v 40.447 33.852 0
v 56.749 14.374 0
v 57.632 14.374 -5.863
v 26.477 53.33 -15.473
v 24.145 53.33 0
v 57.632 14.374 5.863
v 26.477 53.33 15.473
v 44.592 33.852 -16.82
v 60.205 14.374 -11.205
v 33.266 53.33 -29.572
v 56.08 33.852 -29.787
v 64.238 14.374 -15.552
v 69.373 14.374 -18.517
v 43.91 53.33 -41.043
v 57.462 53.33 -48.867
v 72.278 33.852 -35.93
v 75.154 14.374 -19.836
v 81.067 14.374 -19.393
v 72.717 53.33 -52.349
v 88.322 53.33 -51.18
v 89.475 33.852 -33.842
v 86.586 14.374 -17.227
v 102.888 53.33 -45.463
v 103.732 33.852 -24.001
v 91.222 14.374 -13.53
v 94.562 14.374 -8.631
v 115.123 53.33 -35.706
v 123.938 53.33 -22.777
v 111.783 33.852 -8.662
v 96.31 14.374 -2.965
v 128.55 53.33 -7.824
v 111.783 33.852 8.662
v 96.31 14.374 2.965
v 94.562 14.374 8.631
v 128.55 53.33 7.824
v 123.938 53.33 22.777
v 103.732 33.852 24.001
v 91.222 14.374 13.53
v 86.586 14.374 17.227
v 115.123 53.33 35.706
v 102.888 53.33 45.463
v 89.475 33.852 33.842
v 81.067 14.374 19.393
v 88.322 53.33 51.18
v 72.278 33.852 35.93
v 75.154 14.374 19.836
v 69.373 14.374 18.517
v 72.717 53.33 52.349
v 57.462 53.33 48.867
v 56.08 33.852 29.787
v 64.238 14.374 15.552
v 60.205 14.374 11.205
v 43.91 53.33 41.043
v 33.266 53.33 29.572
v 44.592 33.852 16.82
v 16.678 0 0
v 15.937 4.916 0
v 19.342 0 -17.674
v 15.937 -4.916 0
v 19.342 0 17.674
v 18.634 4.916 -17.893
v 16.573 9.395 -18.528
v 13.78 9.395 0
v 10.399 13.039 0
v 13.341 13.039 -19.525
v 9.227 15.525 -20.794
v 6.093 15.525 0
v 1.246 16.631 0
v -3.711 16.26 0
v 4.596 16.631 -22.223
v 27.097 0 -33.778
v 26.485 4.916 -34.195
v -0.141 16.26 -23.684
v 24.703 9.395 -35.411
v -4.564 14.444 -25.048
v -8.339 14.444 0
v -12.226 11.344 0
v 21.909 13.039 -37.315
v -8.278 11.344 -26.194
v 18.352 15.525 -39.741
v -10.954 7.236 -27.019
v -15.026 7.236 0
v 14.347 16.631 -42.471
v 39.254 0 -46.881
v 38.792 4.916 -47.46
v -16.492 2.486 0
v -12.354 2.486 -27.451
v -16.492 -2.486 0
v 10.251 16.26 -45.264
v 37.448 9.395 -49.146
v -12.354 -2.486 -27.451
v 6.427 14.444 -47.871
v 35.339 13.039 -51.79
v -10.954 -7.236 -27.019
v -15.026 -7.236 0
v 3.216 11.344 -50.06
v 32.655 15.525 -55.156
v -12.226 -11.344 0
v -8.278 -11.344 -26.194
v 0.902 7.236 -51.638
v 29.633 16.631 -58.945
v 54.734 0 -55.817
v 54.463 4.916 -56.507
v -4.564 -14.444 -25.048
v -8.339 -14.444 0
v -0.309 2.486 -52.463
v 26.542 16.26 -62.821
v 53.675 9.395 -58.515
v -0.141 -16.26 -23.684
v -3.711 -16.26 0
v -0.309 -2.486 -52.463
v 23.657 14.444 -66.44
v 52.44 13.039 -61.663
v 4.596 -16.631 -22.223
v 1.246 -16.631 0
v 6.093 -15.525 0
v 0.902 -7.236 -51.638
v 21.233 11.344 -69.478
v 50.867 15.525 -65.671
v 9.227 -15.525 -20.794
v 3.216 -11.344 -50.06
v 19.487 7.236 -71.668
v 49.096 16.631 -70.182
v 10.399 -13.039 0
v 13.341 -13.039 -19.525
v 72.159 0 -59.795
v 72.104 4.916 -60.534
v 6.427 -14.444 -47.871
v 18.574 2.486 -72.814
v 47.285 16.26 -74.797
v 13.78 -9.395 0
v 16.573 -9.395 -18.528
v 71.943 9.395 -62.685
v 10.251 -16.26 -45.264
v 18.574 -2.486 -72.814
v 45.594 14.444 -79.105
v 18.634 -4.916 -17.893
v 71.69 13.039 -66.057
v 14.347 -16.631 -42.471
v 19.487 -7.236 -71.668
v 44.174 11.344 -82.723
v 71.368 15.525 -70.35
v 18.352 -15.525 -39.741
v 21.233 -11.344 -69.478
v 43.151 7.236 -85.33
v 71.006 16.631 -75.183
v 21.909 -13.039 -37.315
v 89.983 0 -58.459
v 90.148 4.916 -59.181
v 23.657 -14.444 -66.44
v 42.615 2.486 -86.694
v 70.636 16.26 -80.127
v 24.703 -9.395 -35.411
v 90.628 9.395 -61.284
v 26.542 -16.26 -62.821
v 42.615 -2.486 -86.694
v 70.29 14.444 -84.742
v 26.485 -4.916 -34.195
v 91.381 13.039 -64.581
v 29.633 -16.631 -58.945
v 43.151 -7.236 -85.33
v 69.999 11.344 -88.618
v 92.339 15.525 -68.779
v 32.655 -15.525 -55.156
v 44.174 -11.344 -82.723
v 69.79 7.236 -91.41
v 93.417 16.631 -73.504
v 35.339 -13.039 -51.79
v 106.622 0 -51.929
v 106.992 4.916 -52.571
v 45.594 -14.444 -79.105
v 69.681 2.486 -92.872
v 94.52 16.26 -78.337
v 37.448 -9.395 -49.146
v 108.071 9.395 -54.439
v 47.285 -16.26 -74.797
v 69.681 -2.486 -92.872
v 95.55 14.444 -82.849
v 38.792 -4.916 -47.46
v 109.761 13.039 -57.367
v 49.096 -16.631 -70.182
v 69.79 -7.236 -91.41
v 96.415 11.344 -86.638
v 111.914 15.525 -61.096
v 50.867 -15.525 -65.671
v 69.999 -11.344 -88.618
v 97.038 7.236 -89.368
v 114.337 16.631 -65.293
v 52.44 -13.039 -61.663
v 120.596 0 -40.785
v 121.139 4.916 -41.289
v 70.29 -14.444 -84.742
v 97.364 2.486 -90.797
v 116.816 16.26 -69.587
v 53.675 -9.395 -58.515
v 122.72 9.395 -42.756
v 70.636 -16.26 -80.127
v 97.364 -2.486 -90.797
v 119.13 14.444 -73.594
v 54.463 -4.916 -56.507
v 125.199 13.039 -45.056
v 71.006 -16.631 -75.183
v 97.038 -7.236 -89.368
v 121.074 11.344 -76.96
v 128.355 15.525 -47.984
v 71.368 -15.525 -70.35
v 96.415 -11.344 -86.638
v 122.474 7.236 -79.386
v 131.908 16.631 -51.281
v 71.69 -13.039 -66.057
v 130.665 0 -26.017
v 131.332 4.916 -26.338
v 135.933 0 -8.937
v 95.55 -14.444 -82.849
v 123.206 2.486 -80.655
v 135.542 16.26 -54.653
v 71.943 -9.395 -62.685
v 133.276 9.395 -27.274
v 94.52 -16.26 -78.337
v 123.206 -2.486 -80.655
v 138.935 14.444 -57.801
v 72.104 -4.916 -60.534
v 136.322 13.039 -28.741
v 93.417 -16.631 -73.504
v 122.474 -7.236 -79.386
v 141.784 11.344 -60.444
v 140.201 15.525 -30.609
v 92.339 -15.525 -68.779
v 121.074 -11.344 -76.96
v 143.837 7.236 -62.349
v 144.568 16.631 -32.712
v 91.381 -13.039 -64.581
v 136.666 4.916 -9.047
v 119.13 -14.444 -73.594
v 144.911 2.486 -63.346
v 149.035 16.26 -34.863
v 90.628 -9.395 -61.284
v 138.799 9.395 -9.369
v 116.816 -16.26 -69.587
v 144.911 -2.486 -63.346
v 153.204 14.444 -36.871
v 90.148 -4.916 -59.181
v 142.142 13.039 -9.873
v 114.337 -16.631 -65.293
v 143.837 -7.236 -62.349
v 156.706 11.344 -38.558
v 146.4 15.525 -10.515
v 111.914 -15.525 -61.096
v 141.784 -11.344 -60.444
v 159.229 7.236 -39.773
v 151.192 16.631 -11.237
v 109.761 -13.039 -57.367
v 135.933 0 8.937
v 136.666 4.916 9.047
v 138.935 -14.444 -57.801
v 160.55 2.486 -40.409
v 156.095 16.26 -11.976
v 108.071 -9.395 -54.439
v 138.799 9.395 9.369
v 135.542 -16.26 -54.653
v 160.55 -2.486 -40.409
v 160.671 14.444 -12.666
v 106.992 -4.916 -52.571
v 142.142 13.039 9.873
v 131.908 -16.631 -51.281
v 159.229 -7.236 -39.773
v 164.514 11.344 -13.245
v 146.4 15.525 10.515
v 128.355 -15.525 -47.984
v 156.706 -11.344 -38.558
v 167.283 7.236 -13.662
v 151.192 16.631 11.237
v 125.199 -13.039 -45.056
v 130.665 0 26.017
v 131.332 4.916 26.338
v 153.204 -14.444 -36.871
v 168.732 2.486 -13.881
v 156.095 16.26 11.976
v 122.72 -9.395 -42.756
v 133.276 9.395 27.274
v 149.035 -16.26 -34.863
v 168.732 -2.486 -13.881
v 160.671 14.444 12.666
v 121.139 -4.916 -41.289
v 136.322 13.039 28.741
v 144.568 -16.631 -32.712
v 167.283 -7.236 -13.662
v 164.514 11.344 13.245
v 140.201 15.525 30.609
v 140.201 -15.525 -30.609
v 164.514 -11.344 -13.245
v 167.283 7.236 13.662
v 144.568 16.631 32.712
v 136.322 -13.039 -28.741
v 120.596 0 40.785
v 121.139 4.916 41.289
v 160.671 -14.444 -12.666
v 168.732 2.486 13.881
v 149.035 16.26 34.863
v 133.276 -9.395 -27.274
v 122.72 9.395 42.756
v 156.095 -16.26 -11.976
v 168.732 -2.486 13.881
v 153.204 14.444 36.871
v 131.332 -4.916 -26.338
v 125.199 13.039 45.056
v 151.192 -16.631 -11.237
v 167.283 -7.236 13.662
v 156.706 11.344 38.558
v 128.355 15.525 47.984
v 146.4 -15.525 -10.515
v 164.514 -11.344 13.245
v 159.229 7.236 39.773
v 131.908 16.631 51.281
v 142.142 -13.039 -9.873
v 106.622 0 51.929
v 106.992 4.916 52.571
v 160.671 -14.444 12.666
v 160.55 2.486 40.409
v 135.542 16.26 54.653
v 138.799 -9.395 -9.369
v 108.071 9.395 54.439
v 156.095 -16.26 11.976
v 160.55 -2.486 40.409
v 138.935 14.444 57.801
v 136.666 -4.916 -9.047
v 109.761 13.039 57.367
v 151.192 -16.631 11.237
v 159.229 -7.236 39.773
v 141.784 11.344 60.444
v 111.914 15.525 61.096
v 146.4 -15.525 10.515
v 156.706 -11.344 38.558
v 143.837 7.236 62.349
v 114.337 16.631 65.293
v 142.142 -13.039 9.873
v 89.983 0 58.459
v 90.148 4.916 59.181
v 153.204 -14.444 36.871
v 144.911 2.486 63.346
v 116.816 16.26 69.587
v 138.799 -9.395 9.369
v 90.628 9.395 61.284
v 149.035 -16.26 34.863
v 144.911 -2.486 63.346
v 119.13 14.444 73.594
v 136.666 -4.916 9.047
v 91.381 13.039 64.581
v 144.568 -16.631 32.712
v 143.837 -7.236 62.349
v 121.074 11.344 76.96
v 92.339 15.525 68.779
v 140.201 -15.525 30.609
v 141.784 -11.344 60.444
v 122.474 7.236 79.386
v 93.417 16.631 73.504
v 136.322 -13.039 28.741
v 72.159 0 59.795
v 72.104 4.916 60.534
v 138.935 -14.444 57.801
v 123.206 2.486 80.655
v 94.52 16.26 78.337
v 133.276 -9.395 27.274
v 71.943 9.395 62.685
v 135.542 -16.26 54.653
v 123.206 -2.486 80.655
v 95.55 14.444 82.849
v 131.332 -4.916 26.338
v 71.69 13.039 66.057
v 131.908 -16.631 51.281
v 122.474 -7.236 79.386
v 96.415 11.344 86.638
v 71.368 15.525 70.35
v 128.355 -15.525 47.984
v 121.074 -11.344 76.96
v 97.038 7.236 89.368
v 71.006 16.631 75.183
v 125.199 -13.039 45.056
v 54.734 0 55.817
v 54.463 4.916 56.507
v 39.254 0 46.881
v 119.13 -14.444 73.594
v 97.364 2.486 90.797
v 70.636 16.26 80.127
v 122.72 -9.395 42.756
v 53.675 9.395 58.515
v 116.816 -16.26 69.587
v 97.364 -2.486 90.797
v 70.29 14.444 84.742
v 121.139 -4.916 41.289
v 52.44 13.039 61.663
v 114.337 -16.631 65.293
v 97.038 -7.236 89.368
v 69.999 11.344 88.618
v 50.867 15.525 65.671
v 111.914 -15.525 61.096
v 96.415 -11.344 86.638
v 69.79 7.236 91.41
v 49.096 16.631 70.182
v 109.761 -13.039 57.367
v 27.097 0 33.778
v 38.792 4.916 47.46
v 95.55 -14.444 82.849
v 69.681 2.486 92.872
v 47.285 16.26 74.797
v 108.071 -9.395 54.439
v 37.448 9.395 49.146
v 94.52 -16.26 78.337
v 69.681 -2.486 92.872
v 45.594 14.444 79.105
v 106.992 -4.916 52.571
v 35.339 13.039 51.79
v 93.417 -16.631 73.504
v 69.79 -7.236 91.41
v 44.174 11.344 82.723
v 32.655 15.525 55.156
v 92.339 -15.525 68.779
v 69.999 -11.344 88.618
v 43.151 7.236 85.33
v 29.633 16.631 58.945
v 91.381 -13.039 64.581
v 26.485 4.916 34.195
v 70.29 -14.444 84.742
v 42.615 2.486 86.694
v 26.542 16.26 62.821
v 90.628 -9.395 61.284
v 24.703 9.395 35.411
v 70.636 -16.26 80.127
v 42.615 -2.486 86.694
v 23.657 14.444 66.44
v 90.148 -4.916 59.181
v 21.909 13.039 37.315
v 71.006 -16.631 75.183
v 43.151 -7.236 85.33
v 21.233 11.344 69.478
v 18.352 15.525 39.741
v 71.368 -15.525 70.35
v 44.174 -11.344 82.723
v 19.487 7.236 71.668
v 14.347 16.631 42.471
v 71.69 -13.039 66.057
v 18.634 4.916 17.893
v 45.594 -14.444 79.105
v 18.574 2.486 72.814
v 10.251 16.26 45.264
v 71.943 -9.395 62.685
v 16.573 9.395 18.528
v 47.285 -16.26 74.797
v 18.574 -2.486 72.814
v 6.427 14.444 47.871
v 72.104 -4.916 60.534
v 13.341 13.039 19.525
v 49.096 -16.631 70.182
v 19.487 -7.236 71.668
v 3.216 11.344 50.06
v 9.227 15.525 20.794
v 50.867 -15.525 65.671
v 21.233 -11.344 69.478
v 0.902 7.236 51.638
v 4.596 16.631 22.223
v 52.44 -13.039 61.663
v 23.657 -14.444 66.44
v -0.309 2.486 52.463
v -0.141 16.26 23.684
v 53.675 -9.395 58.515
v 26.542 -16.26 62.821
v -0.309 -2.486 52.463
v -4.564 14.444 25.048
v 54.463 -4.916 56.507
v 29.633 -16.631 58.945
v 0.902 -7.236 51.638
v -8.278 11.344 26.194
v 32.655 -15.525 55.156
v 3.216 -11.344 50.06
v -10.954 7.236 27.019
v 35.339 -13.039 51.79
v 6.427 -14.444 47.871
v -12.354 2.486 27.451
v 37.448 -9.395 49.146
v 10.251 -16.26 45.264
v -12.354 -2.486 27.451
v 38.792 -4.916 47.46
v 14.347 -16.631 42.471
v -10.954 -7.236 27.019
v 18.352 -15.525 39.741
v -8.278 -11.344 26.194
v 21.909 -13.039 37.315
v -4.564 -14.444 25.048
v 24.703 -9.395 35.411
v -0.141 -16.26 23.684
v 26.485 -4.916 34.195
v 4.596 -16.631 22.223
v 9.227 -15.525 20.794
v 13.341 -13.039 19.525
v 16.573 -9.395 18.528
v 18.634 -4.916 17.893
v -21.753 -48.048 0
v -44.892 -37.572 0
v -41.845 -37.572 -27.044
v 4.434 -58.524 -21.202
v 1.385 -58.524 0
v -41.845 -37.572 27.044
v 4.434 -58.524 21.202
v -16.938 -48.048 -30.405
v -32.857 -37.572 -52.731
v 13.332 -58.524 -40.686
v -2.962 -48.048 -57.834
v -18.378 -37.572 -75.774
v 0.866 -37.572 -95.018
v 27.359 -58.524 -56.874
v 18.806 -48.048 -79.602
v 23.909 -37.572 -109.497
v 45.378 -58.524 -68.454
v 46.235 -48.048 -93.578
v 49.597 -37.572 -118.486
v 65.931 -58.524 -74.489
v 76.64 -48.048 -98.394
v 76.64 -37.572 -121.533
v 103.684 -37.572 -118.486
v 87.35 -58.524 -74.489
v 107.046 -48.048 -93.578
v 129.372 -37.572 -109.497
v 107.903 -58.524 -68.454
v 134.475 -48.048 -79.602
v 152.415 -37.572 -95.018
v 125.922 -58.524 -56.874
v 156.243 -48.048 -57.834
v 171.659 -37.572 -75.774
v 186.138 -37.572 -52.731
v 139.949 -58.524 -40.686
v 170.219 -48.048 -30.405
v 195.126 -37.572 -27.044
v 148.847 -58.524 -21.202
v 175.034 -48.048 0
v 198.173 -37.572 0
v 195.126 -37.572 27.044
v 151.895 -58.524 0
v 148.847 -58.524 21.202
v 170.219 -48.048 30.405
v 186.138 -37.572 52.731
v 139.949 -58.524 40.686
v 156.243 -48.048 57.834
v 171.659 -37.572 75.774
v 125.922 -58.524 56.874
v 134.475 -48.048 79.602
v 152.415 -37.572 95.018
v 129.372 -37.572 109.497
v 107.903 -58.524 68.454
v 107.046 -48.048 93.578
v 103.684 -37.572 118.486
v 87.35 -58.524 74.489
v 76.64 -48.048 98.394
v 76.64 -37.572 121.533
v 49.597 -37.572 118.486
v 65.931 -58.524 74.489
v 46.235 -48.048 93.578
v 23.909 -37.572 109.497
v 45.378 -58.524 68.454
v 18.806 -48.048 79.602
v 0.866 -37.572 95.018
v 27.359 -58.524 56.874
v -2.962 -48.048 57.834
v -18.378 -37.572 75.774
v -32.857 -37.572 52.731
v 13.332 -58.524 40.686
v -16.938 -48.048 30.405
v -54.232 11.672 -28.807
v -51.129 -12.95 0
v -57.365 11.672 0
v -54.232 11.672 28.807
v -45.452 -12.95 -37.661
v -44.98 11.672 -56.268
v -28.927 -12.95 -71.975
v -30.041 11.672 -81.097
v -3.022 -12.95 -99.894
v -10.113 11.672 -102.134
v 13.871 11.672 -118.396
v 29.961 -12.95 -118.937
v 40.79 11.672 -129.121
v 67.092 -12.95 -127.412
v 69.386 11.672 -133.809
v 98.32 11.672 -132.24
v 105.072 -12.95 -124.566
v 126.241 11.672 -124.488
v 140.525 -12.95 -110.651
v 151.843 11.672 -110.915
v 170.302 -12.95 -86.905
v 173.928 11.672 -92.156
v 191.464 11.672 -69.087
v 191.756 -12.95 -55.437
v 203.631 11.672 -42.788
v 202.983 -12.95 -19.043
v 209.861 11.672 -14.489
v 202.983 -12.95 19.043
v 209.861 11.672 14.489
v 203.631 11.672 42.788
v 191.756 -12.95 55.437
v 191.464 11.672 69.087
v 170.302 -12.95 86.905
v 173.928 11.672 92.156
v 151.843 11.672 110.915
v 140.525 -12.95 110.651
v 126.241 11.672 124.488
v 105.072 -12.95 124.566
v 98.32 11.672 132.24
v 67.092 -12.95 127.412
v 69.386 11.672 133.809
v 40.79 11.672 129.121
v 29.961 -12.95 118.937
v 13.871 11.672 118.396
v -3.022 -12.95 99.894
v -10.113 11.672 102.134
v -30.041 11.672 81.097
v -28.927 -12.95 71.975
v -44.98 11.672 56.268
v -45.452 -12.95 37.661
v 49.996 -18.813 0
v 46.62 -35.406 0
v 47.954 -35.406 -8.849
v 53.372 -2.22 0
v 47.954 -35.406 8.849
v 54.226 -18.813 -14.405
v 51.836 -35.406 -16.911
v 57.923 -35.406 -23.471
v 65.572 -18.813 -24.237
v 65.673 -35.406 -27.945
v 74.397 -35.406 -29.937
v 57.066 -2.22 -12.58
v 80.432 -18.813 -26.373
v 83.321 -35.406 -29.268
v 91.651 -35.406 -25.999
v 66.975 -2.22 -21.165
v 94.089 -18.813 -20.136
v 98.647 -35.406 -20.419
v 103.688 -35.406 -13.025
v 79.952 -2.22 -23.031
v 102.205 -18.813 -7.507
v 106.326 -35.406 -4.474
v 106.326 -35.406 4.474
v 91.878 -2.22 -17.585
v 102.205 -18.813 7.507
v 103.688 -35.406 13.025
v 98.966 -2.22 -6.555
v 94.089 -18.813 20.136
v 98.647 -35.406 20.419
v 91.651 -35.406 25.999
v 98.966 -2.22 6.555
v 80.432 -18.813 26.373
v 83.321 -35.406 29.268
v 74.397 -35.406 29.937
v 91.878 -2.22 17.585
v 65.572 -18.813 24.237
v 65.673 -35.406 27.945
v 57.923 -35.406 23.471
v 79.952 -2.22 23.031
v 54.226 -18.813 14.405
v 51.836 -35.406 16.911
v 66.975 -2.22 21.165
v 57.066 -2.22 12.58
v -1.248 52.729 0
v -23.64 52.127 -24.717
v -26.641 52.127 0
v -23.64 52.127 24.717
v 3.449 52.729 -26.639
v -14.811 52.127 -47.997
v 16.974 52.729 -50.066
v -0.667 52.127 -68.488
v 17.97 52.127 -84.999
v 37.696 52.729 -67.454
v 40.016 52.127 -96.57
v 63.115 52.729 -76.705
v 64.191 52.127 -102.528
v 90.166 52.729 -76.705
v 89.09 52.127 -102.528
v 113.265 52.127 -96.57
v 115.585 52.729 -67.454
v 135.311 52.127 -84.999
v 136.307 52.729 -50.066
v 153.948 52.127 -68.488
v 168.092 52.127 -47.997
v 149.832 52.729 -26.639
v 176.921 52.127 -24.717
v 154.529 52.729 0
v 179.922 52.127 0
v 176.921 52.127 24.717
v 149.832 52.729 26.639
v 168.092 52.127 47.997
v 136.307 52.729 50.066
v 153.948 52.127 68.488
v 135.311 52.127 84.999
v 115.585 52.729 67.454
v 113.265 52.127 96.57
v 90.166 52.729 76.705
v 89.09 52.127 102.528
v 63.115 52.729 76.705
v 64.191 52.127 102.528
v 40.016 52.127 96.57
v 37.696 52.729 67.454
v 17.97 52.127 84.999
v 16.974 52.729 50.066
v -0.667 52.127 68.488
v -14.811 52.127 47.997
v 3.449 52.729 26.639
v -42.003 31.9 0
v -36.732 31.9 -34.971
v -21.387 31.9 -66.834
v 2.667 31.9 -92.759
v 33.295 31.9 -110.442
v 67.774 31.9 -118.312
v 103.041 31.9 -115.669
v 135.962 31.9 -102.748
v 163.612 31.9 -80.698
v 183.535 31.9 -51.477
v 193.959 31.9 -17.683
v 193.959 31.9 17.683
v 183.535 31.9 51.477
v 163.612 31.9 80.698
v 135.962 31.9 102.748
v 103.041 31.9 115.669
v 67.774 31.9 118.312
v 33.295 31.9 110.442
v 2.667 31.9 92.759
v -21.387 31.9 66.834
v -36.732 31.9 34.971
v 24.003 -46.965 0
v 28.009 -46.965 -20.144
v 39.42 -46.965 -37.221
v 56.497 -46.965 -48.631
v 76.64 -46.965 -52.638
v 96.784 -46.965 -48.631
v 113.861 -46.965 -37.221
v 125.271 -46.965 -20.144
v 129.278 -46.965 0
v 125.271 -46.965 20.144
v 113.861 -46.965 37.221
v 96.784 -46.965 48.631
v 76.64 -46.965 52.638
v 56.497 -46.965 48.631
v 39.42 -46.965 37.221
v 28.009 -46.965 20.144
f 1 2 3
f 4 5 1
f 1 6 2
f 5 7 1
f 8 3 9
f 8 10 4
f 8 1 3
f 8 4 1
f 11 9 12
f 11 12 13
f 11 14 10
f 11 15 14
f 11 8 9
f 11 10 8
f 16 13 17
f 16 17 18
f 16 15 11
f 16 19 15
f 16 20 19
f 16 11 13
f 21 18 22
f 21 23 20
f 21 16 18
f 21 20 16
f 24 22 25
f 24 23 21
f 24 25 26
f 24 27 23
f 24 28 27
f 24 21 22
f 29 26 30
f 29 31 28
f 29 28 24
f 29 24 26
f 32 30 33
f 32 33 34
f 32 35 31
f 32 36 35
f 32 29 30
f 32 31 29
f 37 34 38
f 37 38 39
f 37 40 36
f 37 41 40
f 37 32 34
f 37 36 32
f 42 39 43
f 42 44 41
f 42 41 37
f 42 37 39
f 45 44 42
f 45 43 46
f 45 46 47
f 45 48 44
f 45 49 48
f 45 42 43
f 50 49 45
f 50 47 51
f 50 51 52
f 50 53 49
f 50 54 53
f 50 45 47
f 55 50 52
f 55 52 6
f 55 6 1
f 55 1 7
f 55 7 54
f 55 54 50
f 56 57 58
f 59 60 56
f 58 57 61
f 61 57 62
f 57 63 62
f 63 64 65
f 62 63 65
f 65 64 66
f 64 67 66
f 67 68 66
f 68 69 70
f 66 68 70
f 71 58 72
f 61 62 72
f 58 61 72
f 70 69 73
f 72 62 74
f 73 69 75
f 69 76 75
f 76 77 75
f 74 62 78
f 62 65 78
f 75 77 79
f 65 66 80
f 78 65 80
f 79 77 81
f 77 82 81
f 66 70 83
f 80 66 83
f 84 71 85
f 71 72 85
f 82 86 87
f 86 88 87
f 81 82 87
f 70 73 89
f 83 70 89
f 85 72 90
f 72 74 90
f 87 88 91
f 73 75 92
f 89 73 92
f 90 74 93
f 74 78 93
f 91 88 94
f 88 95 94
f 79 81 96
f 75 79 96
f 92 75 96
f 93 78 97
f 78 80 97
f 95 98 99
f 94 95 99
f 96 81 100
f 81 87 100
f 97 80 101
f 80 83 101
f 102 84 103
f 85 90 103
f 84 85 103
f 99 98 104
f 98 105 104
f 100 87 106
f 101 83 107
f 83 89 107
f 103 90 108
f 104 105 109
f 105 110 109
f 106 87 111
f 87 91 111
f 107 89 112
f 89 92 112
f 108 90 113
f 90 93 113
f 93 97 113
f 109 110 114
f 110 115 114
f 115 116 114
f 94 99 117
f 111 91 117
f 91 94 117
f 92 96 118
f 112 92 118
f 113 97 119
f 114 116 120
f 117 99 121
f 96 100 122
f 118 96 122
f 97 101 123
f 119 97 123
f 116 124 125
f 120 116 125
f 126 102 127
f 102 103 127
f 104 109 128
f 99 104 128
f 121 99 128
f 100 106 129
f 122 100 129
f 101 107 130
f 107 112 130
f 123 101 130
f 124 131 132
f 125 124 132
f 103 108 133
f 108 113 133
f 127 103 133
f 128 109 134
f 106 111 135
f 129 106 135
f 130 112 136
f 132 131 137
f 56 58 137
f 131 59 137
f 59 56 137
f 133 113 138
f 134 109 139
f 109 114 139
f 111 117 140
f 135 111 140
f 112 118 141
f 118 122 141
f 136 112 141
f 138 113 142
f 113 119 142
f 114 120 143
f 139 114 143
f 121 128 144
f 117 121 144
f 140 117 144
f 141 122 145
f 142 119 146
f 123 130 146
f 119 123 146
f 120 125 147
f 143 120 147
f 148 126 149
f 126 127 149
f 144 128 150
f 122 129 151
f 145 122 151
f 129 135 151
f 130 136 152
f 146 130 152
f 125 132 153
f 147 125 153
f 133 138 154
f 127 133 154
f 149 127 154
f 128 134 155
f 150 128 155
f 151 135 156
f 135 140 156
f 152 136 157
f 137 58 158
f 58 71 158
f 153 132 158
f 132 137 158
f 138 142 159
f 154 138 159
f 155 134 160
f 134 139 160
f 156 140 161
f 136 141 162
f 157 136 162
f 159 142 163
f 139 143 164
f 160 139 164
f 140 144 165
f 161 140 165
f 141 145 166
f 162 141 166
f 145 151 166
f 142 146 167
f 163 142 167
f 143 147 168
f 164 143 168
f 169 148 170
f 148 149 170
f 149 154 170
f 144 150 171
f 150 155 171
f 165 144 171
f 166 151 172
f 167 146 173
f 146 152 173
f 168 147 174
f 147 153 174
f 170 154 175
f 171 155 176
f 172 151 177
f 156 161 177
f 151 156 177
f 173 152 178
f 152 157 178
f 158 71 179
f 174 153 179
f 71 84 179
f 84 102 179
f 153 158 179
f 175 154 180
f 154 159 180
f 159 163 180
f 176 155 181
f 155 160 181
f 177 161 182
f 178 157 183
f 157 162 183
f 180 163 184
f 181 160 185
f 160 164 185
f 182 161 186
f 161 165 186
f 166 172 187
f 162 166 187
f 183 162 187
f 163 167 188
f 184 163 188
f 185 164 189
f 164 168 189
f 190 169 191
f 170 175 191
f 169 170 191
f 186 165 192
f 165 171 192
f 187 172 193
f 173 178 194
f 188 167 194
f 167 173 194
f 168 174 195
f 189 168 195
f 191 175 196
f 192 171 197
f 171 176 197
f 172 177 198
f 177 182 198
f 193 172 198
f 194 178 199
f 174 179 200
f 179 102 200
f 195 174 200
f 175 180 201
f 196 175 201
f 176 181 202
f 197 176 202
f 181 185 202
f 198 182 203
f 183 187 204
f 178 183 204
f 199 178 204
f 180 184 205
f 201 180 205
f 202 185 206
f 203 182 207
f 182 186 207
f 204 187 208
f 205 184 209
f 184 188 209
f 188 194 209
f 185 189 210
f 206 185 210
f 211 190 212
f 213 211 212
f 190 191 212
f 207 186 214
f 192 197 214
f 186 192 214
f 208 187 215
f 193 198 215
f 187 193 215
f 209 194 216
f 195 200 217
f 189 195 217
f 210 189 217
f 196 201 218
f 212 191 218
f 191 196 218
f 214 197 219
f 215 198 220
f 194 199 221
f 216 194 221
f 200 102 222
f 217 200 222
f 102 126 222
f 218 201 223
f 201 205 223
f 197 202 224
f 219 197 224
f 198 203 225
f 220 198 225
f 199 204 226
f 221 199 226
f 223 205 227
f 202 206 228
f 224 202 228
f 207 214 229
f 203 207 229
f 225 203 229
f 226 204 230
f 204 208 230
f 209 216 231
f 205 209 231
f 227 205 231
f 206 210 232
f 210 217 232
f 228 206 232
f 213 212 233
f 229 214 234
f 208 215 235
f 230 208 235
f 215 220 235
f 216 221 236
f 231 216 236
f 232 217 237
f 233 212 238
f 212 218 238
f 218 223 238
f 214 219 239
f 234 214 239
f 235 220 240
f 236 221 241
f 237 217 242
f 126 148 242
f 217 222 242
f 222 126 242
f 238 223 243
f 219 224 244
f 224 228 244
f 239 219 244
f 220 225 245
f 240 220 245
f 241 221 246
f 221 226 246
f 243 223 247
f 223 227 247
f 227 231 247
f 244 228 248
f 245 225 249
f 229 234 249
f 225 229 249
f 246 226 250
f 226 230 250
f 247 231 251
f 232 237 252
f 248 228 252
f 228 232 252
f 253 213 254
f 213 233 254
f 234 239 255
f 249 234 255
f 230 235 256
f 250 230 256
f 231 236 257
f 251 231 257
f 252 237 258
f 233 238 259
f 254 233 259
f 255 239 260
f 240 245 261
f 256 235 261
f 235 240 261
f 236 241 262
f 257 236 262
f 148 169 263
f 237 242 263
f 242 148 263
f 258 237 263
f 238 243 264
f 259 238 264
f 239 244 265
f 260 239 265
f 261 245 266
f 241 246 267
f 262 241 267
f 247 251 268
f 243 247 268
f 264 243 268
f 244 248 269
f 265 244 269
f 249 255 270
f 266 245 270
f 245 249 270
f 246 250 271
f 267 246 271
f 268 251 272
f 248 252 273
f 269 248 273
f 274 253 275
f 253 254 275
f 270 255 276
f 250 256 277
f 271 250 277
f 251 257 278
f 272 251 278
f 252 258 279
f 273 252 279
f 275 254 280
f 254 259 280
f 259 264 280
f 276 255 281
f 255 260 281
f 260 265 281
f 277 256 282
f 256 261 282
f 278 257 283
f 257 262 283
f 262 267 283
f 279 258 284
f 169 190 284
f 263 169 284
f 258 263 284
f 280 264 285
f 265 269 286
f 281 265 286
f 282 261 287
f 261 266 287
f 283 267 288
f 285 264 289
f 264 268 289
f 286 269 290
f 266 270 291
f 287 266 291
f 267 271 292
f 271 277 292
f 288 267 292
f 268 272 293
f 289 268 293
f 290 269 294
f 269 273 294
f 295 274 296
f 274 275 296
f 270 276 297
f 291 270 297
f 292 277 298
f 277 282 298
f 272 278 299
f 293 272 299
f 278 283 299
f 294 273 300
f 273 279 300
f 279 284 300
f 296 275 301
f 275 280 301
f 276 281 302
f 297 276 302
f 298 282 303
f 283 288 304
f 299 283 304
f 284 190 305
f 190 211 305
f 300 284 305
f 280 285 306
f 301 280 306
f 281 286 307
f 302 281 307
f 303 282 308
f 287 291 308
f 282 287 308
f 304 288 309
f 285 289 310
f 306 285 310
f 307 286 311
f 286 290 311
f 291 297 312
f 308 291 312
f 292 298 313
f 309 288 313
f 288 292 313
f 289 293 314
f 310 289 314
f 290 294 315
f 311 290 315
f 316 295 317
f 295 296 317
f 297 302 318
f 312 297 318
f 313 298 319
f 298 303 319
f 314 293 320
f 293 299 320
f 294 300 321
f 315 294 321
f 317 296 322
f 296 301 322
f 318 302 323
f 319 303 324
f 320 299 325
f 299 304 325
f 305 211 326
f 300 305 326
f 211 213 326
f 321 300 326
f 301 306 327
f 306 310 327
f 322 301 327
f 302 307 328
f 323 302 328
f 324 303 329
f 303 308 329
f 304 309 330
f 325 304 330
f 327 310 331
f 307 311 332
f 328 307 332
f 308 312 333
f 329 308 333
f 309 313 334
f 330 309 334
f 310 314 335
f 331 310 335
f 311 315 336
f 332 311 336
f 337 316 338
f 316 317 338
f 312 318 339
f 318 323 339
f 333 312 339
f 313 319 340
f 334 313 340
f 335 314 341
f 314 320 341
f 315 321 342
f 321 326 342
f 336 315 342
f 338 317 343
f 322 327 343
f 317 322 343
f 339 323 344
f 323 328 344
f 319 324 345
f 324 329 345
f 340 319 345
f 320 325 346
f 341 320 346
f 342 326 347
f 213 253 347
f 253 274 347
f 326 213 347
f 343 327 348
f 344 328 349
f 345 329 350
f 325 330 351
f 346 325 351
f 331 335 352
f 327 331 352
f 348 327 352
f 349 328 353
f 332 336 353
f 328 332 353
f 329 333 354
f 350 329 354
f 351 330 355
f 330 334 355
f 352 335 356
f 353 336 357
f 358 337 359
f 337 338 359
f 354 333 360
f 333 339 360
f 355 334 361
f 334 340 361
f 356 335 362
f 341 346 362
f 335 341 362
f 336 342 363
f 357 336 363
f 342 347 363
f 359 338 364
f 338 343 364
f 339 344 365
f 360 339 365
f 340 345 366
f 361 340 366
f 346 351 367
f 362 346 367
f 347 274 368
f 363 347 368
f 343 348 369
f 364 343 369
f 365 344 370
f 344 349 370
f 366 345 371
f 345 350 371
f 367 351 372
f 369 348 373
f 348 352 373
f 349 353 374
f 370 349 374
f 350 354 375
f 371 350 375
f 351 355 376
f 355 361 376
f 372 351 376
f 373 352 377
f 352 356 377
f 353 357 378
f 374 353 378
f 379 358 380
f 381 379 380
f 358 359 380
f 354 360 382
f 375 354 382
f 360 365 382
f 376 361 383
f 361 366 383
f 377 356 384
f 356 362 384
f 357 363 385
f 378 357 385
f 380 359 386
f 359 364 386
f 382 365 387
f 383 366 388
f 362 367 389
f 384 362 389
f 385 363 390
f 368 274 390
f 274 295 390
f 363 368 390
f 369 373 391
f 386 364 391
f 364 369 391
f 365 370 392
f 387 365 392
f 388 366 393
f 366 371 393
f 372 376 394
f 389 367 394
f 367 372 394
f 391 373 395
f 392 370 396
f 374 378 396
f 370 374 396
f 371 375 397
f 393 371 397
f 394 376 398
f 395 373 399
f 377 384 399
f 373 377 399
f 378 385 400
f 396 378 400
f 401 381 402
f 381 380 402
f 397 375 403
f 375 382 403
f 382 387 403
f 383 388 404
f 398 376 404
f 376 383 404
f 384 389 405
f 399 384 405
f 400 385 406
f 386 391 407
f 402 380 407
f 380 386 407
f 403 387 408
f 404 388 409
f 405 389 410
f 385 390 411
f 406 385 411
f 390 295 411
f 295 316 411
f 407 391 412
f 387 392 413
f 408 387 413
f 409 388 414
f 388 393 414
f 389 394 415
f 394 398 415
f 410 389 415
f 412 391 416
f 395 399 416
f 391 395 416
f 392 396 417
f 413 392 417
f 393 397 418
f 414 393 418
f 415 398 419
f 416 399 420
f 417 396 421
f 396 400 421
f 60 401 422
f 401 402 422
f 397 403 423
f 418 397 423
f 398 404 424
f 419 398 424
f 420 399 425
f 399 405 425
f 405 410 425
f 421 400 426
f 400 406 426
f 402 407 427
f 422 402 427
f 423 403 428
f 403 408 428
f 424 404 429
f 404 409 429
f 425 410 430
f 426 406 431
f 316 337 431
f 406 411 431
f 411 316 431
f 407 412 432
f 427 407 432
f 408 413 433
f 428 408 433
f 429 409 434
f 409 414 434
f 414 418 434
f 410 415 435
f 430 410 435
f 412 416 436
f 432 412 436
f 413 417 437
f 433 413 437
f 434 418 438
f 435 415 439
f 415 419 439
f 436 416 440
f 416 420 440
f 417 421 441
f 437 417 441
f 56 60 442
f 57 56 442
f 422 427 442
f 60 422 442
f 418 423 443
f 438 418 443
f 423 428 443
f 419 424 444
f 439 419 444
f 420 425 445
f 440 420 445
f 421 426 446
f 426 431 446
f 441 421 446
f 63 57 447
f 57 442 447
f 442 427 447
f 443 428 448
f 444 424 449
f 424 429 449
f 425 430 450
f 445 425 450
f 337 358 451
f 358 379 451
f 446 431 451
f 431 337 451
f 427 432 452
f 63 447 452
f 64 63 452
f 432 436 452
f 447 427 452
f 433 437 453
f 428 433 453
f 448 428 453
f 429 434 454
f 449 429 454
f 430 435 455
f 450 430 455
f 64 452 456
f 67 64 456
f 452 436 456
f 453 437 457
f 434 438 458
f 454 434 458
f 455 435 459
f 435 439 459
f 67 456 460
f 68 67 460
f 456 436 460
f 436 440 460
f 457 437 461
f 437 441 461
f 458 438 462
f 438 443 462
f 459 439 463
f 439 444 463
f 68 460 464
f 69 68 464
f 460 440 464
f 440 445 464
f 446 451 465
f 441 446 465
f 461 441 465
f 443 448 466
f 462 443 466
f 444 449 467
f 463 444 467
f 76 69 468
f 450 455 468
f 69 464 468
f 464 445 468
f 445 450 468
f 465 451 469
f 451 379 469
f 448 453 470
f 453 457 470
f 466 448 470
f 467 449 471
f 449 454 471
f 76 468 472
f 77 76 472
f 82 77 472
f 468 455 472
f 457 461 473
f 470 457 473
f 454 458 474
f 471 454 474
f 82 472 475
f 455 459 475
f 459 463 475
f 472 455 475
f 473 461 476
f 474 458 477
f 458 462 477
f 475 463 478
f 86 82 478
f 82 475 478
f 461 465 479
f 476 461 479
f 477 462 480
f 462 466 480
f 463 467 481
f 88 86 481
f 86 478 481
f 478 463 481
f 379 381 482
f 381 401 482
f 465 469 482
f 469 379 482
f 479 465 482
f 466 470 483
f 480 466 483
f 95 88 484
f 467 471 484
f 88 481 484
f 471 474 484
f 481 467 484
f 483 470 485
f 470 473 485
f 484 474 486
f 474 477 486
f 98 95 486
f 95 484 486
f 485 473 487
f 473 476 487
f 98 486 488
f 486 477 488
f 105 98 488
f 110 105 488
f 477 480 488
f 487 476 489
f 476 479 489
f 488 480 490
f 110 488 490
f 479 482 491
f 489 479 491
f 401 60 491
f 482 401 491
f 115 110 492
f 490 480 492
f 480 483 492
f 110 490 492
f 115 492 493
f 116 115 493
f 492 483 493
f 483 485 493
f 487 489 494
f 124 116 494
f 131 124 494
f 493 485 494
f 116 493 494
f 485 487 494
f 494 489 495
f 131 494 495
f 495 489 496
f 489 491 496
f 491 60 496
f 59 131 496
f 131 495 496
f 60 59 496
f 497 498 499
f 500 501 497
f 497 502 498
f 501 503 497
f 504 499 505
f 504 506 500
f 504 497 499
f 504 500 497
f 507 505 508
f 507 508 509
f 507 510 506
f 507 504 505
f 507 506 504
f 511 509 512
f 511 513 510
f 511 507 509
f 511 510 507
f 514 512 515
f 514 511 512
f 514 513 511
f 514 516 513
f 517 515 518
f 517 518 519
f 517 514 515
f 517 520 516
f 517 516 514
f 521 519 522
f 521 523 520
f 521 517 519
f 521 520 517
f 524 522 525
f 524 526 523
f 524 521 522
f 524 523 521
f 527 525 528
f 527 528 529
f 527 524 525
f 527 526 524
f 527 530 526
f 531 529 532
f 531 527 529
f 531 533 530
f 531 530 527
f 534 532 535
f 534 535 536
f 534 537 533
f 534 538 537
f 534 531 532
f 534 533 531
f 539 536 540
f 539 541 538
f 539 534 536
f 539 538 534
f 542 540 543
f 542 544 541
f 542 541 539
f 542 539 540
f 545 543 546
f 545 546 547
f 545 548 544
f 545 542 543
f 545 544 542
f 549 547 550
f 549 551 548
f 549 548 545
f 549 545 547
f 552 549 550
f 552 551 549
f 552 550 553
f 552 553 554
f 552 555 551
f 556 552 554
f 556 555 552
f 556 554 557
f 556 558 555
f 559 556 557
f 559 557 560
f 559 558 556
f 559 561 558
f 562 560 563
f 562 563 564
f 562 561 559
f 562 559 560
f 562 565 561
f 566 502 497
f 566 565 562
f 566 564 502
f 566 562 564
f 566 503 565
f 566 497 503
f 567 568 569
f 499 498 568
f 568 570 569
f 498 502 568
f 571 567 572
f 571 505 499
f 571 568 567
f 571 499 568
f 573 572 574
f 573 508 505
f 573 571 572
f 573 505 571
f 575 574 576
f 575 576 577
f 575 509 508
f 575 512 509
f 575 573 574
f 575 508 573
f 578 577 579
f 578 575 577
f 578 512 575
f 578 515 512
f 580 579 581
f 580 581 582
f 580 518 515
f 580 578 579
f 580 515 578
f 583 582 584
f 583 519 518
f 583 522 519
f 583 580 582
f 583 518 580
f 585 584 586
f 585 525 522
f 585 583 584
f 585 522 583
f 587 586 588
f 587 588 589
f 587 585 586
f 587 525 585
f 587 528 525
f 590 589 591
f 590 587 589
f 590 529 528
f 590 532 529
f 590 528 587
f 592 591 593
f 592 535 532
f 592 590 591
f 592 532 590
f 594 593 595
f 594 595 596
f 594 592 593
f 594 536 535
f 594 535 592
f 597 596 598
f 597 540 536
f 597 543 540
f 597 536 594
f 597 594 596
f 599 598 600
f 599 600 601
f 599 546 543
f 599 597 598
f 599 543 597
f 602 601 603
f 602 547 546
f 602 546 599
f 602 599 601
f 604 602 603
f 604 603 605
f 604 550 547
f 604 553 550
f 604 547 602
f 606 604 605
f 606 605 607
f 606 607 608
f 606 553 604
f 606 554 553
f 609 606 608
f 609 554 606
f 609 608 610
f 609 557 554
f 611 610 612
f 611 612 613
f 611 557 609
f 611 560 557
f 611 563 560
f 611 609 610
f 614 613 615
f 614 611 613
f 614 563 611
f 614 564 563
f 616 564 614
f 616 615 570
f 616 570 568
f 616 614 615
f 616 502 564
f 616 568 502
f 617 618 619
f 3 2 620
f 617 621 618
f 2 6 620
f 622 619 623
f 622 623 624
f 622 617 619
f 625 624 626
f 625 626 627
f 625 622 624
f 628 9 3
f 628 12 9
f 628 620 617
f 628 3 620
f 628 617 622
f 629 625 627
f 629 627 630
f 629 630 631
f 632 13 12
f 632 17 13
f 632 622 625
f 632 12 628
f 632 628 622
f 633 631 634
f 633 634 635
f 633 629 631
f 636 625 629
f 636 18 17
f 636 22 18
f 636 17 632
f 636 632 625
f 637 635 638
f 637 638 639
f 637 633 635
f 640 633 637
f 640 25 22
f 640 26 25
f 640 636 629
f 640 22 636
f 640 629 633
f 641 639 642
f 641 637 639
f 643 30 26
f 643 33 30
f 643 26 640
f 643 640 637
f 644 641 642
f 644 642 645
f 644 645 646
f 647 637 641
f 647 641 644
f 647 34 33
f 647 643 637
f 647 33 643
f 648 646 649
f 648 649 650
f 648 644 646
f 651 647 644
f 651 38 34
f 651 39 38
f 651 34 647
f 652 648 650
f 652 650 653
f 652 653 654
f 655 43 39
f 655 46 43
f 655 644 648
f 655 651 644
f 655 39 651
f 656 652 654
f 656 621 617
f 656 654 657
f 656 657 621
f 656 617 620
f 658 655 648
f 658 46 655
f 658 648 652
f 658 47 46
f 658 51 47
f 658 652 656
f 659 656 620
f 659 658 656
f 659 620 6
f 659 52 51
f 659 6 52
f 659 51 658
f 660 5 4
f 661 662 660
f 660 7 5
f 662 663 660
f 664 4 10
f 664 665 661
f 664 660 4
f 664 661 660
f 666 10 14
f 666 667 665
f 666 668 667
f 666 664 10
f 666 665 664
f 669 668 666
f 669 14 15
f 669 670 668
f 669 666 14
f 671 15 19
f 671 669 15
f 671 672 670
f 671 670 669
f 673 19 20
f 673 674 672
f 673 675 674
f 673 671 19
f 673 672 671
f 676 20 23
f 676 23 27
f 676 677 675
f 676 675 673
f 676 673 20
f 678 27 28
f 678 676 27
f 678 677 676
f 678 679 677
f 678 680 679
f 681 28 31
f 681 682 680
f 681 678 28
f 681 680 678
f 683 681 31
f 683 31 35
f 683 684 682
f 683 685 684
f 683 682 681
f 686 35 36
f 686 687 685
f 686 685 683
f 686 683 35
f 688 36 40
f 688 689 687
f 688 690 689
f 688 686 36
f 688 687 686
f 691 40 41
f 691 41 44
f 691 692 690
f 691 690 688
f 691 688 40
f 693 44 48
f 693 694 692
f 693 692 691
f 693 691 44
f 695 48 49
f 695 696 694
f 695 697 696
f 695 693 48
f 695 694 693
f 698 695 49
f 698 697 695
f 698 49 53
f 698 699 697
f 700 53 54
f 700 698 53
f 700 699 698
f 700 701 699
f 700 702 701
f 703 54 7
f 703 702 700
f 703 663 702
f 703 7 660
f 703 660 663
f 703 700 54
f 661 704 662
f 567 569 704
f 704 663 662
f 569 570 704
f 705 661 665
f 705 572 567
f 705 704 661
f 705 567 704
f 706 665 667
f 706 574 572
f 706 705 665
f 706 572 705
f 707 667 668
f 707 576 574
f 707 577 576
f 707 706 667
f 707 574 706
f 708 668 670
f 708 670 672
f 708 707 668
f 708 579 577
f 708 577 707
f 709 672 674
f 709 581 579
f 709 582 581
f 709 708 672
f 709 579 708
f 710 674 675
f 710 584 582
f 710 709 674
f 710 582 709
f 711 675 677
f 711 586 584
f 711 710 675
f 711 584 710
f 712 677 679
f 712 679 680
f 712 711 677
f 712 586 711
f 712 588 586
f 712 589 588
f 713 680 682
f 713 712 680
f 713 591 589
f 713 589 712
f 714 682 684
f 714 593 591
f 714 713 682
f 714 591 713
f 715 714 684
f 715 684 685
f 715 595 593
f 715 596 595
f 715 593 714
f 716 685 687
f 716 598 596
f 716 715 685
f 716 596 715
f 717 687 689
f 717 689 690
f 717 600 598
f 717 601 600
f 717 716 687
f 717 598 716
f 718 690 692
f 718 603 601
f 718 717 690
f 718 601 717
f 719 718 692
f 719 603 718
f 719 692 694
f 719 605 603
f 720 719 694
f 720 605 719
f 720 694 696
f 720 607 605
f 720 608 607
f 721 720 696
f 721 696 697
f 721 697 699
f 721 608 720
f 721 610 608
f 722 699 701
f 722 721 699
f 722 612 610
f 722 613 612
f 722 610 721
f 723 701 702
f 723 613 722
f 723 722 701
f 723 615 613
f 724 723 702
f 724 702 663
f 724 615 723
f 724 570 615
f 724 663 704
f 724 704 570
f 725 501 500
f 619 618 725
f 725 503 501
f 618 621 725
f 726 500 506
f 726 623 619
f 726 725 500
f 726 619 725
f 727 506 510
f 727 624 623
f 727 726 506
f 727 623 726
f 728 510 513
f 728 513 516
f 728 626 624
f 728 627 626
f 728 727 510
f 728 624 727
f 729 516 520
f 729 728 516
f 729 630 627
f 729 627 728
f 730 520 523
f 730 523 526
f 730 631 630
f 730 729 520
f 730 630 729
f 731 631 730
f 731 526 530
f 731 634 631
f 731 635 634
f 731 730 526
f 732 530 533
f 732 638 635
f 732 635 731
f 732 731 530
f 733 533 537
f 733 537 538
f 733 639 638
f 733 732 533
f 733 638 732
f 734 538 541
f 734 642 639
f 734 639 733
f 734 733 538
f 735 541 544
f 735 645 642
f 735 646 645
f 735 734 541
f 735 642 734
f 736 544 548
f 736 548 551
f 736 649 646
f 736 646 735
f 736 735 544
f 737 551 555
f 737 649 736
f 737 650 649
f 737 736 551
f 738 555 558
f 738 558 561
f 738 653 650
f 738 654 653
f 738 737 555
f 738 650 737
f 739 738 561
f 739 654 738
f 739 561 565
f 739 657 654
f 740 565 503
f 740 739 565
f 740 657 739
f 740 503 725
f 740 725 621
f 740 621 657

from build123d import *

# Parameters (mm, degrees)
F0_R = 16.677954


with BuildPart() as f2:
    # F0 (on Top) → F2 (revolve)
    with BuildSketch(Plane.XY):
        Polygon((46.619876, -35.406111), (56.74863, 14.373538), (24.144508, 53.329619), (-26.640921, 52.12741), (-57.365193, 11.672198), (-44.892304, -37.572418), (1.385405, -58.524236), align=None)
        Circle(F0_R, mode=Mode.SUBTRACT)
    revolve(axis=Axis((76.640435, 3.132816, 0), (0, -1, 0)))


solid = f2.part
